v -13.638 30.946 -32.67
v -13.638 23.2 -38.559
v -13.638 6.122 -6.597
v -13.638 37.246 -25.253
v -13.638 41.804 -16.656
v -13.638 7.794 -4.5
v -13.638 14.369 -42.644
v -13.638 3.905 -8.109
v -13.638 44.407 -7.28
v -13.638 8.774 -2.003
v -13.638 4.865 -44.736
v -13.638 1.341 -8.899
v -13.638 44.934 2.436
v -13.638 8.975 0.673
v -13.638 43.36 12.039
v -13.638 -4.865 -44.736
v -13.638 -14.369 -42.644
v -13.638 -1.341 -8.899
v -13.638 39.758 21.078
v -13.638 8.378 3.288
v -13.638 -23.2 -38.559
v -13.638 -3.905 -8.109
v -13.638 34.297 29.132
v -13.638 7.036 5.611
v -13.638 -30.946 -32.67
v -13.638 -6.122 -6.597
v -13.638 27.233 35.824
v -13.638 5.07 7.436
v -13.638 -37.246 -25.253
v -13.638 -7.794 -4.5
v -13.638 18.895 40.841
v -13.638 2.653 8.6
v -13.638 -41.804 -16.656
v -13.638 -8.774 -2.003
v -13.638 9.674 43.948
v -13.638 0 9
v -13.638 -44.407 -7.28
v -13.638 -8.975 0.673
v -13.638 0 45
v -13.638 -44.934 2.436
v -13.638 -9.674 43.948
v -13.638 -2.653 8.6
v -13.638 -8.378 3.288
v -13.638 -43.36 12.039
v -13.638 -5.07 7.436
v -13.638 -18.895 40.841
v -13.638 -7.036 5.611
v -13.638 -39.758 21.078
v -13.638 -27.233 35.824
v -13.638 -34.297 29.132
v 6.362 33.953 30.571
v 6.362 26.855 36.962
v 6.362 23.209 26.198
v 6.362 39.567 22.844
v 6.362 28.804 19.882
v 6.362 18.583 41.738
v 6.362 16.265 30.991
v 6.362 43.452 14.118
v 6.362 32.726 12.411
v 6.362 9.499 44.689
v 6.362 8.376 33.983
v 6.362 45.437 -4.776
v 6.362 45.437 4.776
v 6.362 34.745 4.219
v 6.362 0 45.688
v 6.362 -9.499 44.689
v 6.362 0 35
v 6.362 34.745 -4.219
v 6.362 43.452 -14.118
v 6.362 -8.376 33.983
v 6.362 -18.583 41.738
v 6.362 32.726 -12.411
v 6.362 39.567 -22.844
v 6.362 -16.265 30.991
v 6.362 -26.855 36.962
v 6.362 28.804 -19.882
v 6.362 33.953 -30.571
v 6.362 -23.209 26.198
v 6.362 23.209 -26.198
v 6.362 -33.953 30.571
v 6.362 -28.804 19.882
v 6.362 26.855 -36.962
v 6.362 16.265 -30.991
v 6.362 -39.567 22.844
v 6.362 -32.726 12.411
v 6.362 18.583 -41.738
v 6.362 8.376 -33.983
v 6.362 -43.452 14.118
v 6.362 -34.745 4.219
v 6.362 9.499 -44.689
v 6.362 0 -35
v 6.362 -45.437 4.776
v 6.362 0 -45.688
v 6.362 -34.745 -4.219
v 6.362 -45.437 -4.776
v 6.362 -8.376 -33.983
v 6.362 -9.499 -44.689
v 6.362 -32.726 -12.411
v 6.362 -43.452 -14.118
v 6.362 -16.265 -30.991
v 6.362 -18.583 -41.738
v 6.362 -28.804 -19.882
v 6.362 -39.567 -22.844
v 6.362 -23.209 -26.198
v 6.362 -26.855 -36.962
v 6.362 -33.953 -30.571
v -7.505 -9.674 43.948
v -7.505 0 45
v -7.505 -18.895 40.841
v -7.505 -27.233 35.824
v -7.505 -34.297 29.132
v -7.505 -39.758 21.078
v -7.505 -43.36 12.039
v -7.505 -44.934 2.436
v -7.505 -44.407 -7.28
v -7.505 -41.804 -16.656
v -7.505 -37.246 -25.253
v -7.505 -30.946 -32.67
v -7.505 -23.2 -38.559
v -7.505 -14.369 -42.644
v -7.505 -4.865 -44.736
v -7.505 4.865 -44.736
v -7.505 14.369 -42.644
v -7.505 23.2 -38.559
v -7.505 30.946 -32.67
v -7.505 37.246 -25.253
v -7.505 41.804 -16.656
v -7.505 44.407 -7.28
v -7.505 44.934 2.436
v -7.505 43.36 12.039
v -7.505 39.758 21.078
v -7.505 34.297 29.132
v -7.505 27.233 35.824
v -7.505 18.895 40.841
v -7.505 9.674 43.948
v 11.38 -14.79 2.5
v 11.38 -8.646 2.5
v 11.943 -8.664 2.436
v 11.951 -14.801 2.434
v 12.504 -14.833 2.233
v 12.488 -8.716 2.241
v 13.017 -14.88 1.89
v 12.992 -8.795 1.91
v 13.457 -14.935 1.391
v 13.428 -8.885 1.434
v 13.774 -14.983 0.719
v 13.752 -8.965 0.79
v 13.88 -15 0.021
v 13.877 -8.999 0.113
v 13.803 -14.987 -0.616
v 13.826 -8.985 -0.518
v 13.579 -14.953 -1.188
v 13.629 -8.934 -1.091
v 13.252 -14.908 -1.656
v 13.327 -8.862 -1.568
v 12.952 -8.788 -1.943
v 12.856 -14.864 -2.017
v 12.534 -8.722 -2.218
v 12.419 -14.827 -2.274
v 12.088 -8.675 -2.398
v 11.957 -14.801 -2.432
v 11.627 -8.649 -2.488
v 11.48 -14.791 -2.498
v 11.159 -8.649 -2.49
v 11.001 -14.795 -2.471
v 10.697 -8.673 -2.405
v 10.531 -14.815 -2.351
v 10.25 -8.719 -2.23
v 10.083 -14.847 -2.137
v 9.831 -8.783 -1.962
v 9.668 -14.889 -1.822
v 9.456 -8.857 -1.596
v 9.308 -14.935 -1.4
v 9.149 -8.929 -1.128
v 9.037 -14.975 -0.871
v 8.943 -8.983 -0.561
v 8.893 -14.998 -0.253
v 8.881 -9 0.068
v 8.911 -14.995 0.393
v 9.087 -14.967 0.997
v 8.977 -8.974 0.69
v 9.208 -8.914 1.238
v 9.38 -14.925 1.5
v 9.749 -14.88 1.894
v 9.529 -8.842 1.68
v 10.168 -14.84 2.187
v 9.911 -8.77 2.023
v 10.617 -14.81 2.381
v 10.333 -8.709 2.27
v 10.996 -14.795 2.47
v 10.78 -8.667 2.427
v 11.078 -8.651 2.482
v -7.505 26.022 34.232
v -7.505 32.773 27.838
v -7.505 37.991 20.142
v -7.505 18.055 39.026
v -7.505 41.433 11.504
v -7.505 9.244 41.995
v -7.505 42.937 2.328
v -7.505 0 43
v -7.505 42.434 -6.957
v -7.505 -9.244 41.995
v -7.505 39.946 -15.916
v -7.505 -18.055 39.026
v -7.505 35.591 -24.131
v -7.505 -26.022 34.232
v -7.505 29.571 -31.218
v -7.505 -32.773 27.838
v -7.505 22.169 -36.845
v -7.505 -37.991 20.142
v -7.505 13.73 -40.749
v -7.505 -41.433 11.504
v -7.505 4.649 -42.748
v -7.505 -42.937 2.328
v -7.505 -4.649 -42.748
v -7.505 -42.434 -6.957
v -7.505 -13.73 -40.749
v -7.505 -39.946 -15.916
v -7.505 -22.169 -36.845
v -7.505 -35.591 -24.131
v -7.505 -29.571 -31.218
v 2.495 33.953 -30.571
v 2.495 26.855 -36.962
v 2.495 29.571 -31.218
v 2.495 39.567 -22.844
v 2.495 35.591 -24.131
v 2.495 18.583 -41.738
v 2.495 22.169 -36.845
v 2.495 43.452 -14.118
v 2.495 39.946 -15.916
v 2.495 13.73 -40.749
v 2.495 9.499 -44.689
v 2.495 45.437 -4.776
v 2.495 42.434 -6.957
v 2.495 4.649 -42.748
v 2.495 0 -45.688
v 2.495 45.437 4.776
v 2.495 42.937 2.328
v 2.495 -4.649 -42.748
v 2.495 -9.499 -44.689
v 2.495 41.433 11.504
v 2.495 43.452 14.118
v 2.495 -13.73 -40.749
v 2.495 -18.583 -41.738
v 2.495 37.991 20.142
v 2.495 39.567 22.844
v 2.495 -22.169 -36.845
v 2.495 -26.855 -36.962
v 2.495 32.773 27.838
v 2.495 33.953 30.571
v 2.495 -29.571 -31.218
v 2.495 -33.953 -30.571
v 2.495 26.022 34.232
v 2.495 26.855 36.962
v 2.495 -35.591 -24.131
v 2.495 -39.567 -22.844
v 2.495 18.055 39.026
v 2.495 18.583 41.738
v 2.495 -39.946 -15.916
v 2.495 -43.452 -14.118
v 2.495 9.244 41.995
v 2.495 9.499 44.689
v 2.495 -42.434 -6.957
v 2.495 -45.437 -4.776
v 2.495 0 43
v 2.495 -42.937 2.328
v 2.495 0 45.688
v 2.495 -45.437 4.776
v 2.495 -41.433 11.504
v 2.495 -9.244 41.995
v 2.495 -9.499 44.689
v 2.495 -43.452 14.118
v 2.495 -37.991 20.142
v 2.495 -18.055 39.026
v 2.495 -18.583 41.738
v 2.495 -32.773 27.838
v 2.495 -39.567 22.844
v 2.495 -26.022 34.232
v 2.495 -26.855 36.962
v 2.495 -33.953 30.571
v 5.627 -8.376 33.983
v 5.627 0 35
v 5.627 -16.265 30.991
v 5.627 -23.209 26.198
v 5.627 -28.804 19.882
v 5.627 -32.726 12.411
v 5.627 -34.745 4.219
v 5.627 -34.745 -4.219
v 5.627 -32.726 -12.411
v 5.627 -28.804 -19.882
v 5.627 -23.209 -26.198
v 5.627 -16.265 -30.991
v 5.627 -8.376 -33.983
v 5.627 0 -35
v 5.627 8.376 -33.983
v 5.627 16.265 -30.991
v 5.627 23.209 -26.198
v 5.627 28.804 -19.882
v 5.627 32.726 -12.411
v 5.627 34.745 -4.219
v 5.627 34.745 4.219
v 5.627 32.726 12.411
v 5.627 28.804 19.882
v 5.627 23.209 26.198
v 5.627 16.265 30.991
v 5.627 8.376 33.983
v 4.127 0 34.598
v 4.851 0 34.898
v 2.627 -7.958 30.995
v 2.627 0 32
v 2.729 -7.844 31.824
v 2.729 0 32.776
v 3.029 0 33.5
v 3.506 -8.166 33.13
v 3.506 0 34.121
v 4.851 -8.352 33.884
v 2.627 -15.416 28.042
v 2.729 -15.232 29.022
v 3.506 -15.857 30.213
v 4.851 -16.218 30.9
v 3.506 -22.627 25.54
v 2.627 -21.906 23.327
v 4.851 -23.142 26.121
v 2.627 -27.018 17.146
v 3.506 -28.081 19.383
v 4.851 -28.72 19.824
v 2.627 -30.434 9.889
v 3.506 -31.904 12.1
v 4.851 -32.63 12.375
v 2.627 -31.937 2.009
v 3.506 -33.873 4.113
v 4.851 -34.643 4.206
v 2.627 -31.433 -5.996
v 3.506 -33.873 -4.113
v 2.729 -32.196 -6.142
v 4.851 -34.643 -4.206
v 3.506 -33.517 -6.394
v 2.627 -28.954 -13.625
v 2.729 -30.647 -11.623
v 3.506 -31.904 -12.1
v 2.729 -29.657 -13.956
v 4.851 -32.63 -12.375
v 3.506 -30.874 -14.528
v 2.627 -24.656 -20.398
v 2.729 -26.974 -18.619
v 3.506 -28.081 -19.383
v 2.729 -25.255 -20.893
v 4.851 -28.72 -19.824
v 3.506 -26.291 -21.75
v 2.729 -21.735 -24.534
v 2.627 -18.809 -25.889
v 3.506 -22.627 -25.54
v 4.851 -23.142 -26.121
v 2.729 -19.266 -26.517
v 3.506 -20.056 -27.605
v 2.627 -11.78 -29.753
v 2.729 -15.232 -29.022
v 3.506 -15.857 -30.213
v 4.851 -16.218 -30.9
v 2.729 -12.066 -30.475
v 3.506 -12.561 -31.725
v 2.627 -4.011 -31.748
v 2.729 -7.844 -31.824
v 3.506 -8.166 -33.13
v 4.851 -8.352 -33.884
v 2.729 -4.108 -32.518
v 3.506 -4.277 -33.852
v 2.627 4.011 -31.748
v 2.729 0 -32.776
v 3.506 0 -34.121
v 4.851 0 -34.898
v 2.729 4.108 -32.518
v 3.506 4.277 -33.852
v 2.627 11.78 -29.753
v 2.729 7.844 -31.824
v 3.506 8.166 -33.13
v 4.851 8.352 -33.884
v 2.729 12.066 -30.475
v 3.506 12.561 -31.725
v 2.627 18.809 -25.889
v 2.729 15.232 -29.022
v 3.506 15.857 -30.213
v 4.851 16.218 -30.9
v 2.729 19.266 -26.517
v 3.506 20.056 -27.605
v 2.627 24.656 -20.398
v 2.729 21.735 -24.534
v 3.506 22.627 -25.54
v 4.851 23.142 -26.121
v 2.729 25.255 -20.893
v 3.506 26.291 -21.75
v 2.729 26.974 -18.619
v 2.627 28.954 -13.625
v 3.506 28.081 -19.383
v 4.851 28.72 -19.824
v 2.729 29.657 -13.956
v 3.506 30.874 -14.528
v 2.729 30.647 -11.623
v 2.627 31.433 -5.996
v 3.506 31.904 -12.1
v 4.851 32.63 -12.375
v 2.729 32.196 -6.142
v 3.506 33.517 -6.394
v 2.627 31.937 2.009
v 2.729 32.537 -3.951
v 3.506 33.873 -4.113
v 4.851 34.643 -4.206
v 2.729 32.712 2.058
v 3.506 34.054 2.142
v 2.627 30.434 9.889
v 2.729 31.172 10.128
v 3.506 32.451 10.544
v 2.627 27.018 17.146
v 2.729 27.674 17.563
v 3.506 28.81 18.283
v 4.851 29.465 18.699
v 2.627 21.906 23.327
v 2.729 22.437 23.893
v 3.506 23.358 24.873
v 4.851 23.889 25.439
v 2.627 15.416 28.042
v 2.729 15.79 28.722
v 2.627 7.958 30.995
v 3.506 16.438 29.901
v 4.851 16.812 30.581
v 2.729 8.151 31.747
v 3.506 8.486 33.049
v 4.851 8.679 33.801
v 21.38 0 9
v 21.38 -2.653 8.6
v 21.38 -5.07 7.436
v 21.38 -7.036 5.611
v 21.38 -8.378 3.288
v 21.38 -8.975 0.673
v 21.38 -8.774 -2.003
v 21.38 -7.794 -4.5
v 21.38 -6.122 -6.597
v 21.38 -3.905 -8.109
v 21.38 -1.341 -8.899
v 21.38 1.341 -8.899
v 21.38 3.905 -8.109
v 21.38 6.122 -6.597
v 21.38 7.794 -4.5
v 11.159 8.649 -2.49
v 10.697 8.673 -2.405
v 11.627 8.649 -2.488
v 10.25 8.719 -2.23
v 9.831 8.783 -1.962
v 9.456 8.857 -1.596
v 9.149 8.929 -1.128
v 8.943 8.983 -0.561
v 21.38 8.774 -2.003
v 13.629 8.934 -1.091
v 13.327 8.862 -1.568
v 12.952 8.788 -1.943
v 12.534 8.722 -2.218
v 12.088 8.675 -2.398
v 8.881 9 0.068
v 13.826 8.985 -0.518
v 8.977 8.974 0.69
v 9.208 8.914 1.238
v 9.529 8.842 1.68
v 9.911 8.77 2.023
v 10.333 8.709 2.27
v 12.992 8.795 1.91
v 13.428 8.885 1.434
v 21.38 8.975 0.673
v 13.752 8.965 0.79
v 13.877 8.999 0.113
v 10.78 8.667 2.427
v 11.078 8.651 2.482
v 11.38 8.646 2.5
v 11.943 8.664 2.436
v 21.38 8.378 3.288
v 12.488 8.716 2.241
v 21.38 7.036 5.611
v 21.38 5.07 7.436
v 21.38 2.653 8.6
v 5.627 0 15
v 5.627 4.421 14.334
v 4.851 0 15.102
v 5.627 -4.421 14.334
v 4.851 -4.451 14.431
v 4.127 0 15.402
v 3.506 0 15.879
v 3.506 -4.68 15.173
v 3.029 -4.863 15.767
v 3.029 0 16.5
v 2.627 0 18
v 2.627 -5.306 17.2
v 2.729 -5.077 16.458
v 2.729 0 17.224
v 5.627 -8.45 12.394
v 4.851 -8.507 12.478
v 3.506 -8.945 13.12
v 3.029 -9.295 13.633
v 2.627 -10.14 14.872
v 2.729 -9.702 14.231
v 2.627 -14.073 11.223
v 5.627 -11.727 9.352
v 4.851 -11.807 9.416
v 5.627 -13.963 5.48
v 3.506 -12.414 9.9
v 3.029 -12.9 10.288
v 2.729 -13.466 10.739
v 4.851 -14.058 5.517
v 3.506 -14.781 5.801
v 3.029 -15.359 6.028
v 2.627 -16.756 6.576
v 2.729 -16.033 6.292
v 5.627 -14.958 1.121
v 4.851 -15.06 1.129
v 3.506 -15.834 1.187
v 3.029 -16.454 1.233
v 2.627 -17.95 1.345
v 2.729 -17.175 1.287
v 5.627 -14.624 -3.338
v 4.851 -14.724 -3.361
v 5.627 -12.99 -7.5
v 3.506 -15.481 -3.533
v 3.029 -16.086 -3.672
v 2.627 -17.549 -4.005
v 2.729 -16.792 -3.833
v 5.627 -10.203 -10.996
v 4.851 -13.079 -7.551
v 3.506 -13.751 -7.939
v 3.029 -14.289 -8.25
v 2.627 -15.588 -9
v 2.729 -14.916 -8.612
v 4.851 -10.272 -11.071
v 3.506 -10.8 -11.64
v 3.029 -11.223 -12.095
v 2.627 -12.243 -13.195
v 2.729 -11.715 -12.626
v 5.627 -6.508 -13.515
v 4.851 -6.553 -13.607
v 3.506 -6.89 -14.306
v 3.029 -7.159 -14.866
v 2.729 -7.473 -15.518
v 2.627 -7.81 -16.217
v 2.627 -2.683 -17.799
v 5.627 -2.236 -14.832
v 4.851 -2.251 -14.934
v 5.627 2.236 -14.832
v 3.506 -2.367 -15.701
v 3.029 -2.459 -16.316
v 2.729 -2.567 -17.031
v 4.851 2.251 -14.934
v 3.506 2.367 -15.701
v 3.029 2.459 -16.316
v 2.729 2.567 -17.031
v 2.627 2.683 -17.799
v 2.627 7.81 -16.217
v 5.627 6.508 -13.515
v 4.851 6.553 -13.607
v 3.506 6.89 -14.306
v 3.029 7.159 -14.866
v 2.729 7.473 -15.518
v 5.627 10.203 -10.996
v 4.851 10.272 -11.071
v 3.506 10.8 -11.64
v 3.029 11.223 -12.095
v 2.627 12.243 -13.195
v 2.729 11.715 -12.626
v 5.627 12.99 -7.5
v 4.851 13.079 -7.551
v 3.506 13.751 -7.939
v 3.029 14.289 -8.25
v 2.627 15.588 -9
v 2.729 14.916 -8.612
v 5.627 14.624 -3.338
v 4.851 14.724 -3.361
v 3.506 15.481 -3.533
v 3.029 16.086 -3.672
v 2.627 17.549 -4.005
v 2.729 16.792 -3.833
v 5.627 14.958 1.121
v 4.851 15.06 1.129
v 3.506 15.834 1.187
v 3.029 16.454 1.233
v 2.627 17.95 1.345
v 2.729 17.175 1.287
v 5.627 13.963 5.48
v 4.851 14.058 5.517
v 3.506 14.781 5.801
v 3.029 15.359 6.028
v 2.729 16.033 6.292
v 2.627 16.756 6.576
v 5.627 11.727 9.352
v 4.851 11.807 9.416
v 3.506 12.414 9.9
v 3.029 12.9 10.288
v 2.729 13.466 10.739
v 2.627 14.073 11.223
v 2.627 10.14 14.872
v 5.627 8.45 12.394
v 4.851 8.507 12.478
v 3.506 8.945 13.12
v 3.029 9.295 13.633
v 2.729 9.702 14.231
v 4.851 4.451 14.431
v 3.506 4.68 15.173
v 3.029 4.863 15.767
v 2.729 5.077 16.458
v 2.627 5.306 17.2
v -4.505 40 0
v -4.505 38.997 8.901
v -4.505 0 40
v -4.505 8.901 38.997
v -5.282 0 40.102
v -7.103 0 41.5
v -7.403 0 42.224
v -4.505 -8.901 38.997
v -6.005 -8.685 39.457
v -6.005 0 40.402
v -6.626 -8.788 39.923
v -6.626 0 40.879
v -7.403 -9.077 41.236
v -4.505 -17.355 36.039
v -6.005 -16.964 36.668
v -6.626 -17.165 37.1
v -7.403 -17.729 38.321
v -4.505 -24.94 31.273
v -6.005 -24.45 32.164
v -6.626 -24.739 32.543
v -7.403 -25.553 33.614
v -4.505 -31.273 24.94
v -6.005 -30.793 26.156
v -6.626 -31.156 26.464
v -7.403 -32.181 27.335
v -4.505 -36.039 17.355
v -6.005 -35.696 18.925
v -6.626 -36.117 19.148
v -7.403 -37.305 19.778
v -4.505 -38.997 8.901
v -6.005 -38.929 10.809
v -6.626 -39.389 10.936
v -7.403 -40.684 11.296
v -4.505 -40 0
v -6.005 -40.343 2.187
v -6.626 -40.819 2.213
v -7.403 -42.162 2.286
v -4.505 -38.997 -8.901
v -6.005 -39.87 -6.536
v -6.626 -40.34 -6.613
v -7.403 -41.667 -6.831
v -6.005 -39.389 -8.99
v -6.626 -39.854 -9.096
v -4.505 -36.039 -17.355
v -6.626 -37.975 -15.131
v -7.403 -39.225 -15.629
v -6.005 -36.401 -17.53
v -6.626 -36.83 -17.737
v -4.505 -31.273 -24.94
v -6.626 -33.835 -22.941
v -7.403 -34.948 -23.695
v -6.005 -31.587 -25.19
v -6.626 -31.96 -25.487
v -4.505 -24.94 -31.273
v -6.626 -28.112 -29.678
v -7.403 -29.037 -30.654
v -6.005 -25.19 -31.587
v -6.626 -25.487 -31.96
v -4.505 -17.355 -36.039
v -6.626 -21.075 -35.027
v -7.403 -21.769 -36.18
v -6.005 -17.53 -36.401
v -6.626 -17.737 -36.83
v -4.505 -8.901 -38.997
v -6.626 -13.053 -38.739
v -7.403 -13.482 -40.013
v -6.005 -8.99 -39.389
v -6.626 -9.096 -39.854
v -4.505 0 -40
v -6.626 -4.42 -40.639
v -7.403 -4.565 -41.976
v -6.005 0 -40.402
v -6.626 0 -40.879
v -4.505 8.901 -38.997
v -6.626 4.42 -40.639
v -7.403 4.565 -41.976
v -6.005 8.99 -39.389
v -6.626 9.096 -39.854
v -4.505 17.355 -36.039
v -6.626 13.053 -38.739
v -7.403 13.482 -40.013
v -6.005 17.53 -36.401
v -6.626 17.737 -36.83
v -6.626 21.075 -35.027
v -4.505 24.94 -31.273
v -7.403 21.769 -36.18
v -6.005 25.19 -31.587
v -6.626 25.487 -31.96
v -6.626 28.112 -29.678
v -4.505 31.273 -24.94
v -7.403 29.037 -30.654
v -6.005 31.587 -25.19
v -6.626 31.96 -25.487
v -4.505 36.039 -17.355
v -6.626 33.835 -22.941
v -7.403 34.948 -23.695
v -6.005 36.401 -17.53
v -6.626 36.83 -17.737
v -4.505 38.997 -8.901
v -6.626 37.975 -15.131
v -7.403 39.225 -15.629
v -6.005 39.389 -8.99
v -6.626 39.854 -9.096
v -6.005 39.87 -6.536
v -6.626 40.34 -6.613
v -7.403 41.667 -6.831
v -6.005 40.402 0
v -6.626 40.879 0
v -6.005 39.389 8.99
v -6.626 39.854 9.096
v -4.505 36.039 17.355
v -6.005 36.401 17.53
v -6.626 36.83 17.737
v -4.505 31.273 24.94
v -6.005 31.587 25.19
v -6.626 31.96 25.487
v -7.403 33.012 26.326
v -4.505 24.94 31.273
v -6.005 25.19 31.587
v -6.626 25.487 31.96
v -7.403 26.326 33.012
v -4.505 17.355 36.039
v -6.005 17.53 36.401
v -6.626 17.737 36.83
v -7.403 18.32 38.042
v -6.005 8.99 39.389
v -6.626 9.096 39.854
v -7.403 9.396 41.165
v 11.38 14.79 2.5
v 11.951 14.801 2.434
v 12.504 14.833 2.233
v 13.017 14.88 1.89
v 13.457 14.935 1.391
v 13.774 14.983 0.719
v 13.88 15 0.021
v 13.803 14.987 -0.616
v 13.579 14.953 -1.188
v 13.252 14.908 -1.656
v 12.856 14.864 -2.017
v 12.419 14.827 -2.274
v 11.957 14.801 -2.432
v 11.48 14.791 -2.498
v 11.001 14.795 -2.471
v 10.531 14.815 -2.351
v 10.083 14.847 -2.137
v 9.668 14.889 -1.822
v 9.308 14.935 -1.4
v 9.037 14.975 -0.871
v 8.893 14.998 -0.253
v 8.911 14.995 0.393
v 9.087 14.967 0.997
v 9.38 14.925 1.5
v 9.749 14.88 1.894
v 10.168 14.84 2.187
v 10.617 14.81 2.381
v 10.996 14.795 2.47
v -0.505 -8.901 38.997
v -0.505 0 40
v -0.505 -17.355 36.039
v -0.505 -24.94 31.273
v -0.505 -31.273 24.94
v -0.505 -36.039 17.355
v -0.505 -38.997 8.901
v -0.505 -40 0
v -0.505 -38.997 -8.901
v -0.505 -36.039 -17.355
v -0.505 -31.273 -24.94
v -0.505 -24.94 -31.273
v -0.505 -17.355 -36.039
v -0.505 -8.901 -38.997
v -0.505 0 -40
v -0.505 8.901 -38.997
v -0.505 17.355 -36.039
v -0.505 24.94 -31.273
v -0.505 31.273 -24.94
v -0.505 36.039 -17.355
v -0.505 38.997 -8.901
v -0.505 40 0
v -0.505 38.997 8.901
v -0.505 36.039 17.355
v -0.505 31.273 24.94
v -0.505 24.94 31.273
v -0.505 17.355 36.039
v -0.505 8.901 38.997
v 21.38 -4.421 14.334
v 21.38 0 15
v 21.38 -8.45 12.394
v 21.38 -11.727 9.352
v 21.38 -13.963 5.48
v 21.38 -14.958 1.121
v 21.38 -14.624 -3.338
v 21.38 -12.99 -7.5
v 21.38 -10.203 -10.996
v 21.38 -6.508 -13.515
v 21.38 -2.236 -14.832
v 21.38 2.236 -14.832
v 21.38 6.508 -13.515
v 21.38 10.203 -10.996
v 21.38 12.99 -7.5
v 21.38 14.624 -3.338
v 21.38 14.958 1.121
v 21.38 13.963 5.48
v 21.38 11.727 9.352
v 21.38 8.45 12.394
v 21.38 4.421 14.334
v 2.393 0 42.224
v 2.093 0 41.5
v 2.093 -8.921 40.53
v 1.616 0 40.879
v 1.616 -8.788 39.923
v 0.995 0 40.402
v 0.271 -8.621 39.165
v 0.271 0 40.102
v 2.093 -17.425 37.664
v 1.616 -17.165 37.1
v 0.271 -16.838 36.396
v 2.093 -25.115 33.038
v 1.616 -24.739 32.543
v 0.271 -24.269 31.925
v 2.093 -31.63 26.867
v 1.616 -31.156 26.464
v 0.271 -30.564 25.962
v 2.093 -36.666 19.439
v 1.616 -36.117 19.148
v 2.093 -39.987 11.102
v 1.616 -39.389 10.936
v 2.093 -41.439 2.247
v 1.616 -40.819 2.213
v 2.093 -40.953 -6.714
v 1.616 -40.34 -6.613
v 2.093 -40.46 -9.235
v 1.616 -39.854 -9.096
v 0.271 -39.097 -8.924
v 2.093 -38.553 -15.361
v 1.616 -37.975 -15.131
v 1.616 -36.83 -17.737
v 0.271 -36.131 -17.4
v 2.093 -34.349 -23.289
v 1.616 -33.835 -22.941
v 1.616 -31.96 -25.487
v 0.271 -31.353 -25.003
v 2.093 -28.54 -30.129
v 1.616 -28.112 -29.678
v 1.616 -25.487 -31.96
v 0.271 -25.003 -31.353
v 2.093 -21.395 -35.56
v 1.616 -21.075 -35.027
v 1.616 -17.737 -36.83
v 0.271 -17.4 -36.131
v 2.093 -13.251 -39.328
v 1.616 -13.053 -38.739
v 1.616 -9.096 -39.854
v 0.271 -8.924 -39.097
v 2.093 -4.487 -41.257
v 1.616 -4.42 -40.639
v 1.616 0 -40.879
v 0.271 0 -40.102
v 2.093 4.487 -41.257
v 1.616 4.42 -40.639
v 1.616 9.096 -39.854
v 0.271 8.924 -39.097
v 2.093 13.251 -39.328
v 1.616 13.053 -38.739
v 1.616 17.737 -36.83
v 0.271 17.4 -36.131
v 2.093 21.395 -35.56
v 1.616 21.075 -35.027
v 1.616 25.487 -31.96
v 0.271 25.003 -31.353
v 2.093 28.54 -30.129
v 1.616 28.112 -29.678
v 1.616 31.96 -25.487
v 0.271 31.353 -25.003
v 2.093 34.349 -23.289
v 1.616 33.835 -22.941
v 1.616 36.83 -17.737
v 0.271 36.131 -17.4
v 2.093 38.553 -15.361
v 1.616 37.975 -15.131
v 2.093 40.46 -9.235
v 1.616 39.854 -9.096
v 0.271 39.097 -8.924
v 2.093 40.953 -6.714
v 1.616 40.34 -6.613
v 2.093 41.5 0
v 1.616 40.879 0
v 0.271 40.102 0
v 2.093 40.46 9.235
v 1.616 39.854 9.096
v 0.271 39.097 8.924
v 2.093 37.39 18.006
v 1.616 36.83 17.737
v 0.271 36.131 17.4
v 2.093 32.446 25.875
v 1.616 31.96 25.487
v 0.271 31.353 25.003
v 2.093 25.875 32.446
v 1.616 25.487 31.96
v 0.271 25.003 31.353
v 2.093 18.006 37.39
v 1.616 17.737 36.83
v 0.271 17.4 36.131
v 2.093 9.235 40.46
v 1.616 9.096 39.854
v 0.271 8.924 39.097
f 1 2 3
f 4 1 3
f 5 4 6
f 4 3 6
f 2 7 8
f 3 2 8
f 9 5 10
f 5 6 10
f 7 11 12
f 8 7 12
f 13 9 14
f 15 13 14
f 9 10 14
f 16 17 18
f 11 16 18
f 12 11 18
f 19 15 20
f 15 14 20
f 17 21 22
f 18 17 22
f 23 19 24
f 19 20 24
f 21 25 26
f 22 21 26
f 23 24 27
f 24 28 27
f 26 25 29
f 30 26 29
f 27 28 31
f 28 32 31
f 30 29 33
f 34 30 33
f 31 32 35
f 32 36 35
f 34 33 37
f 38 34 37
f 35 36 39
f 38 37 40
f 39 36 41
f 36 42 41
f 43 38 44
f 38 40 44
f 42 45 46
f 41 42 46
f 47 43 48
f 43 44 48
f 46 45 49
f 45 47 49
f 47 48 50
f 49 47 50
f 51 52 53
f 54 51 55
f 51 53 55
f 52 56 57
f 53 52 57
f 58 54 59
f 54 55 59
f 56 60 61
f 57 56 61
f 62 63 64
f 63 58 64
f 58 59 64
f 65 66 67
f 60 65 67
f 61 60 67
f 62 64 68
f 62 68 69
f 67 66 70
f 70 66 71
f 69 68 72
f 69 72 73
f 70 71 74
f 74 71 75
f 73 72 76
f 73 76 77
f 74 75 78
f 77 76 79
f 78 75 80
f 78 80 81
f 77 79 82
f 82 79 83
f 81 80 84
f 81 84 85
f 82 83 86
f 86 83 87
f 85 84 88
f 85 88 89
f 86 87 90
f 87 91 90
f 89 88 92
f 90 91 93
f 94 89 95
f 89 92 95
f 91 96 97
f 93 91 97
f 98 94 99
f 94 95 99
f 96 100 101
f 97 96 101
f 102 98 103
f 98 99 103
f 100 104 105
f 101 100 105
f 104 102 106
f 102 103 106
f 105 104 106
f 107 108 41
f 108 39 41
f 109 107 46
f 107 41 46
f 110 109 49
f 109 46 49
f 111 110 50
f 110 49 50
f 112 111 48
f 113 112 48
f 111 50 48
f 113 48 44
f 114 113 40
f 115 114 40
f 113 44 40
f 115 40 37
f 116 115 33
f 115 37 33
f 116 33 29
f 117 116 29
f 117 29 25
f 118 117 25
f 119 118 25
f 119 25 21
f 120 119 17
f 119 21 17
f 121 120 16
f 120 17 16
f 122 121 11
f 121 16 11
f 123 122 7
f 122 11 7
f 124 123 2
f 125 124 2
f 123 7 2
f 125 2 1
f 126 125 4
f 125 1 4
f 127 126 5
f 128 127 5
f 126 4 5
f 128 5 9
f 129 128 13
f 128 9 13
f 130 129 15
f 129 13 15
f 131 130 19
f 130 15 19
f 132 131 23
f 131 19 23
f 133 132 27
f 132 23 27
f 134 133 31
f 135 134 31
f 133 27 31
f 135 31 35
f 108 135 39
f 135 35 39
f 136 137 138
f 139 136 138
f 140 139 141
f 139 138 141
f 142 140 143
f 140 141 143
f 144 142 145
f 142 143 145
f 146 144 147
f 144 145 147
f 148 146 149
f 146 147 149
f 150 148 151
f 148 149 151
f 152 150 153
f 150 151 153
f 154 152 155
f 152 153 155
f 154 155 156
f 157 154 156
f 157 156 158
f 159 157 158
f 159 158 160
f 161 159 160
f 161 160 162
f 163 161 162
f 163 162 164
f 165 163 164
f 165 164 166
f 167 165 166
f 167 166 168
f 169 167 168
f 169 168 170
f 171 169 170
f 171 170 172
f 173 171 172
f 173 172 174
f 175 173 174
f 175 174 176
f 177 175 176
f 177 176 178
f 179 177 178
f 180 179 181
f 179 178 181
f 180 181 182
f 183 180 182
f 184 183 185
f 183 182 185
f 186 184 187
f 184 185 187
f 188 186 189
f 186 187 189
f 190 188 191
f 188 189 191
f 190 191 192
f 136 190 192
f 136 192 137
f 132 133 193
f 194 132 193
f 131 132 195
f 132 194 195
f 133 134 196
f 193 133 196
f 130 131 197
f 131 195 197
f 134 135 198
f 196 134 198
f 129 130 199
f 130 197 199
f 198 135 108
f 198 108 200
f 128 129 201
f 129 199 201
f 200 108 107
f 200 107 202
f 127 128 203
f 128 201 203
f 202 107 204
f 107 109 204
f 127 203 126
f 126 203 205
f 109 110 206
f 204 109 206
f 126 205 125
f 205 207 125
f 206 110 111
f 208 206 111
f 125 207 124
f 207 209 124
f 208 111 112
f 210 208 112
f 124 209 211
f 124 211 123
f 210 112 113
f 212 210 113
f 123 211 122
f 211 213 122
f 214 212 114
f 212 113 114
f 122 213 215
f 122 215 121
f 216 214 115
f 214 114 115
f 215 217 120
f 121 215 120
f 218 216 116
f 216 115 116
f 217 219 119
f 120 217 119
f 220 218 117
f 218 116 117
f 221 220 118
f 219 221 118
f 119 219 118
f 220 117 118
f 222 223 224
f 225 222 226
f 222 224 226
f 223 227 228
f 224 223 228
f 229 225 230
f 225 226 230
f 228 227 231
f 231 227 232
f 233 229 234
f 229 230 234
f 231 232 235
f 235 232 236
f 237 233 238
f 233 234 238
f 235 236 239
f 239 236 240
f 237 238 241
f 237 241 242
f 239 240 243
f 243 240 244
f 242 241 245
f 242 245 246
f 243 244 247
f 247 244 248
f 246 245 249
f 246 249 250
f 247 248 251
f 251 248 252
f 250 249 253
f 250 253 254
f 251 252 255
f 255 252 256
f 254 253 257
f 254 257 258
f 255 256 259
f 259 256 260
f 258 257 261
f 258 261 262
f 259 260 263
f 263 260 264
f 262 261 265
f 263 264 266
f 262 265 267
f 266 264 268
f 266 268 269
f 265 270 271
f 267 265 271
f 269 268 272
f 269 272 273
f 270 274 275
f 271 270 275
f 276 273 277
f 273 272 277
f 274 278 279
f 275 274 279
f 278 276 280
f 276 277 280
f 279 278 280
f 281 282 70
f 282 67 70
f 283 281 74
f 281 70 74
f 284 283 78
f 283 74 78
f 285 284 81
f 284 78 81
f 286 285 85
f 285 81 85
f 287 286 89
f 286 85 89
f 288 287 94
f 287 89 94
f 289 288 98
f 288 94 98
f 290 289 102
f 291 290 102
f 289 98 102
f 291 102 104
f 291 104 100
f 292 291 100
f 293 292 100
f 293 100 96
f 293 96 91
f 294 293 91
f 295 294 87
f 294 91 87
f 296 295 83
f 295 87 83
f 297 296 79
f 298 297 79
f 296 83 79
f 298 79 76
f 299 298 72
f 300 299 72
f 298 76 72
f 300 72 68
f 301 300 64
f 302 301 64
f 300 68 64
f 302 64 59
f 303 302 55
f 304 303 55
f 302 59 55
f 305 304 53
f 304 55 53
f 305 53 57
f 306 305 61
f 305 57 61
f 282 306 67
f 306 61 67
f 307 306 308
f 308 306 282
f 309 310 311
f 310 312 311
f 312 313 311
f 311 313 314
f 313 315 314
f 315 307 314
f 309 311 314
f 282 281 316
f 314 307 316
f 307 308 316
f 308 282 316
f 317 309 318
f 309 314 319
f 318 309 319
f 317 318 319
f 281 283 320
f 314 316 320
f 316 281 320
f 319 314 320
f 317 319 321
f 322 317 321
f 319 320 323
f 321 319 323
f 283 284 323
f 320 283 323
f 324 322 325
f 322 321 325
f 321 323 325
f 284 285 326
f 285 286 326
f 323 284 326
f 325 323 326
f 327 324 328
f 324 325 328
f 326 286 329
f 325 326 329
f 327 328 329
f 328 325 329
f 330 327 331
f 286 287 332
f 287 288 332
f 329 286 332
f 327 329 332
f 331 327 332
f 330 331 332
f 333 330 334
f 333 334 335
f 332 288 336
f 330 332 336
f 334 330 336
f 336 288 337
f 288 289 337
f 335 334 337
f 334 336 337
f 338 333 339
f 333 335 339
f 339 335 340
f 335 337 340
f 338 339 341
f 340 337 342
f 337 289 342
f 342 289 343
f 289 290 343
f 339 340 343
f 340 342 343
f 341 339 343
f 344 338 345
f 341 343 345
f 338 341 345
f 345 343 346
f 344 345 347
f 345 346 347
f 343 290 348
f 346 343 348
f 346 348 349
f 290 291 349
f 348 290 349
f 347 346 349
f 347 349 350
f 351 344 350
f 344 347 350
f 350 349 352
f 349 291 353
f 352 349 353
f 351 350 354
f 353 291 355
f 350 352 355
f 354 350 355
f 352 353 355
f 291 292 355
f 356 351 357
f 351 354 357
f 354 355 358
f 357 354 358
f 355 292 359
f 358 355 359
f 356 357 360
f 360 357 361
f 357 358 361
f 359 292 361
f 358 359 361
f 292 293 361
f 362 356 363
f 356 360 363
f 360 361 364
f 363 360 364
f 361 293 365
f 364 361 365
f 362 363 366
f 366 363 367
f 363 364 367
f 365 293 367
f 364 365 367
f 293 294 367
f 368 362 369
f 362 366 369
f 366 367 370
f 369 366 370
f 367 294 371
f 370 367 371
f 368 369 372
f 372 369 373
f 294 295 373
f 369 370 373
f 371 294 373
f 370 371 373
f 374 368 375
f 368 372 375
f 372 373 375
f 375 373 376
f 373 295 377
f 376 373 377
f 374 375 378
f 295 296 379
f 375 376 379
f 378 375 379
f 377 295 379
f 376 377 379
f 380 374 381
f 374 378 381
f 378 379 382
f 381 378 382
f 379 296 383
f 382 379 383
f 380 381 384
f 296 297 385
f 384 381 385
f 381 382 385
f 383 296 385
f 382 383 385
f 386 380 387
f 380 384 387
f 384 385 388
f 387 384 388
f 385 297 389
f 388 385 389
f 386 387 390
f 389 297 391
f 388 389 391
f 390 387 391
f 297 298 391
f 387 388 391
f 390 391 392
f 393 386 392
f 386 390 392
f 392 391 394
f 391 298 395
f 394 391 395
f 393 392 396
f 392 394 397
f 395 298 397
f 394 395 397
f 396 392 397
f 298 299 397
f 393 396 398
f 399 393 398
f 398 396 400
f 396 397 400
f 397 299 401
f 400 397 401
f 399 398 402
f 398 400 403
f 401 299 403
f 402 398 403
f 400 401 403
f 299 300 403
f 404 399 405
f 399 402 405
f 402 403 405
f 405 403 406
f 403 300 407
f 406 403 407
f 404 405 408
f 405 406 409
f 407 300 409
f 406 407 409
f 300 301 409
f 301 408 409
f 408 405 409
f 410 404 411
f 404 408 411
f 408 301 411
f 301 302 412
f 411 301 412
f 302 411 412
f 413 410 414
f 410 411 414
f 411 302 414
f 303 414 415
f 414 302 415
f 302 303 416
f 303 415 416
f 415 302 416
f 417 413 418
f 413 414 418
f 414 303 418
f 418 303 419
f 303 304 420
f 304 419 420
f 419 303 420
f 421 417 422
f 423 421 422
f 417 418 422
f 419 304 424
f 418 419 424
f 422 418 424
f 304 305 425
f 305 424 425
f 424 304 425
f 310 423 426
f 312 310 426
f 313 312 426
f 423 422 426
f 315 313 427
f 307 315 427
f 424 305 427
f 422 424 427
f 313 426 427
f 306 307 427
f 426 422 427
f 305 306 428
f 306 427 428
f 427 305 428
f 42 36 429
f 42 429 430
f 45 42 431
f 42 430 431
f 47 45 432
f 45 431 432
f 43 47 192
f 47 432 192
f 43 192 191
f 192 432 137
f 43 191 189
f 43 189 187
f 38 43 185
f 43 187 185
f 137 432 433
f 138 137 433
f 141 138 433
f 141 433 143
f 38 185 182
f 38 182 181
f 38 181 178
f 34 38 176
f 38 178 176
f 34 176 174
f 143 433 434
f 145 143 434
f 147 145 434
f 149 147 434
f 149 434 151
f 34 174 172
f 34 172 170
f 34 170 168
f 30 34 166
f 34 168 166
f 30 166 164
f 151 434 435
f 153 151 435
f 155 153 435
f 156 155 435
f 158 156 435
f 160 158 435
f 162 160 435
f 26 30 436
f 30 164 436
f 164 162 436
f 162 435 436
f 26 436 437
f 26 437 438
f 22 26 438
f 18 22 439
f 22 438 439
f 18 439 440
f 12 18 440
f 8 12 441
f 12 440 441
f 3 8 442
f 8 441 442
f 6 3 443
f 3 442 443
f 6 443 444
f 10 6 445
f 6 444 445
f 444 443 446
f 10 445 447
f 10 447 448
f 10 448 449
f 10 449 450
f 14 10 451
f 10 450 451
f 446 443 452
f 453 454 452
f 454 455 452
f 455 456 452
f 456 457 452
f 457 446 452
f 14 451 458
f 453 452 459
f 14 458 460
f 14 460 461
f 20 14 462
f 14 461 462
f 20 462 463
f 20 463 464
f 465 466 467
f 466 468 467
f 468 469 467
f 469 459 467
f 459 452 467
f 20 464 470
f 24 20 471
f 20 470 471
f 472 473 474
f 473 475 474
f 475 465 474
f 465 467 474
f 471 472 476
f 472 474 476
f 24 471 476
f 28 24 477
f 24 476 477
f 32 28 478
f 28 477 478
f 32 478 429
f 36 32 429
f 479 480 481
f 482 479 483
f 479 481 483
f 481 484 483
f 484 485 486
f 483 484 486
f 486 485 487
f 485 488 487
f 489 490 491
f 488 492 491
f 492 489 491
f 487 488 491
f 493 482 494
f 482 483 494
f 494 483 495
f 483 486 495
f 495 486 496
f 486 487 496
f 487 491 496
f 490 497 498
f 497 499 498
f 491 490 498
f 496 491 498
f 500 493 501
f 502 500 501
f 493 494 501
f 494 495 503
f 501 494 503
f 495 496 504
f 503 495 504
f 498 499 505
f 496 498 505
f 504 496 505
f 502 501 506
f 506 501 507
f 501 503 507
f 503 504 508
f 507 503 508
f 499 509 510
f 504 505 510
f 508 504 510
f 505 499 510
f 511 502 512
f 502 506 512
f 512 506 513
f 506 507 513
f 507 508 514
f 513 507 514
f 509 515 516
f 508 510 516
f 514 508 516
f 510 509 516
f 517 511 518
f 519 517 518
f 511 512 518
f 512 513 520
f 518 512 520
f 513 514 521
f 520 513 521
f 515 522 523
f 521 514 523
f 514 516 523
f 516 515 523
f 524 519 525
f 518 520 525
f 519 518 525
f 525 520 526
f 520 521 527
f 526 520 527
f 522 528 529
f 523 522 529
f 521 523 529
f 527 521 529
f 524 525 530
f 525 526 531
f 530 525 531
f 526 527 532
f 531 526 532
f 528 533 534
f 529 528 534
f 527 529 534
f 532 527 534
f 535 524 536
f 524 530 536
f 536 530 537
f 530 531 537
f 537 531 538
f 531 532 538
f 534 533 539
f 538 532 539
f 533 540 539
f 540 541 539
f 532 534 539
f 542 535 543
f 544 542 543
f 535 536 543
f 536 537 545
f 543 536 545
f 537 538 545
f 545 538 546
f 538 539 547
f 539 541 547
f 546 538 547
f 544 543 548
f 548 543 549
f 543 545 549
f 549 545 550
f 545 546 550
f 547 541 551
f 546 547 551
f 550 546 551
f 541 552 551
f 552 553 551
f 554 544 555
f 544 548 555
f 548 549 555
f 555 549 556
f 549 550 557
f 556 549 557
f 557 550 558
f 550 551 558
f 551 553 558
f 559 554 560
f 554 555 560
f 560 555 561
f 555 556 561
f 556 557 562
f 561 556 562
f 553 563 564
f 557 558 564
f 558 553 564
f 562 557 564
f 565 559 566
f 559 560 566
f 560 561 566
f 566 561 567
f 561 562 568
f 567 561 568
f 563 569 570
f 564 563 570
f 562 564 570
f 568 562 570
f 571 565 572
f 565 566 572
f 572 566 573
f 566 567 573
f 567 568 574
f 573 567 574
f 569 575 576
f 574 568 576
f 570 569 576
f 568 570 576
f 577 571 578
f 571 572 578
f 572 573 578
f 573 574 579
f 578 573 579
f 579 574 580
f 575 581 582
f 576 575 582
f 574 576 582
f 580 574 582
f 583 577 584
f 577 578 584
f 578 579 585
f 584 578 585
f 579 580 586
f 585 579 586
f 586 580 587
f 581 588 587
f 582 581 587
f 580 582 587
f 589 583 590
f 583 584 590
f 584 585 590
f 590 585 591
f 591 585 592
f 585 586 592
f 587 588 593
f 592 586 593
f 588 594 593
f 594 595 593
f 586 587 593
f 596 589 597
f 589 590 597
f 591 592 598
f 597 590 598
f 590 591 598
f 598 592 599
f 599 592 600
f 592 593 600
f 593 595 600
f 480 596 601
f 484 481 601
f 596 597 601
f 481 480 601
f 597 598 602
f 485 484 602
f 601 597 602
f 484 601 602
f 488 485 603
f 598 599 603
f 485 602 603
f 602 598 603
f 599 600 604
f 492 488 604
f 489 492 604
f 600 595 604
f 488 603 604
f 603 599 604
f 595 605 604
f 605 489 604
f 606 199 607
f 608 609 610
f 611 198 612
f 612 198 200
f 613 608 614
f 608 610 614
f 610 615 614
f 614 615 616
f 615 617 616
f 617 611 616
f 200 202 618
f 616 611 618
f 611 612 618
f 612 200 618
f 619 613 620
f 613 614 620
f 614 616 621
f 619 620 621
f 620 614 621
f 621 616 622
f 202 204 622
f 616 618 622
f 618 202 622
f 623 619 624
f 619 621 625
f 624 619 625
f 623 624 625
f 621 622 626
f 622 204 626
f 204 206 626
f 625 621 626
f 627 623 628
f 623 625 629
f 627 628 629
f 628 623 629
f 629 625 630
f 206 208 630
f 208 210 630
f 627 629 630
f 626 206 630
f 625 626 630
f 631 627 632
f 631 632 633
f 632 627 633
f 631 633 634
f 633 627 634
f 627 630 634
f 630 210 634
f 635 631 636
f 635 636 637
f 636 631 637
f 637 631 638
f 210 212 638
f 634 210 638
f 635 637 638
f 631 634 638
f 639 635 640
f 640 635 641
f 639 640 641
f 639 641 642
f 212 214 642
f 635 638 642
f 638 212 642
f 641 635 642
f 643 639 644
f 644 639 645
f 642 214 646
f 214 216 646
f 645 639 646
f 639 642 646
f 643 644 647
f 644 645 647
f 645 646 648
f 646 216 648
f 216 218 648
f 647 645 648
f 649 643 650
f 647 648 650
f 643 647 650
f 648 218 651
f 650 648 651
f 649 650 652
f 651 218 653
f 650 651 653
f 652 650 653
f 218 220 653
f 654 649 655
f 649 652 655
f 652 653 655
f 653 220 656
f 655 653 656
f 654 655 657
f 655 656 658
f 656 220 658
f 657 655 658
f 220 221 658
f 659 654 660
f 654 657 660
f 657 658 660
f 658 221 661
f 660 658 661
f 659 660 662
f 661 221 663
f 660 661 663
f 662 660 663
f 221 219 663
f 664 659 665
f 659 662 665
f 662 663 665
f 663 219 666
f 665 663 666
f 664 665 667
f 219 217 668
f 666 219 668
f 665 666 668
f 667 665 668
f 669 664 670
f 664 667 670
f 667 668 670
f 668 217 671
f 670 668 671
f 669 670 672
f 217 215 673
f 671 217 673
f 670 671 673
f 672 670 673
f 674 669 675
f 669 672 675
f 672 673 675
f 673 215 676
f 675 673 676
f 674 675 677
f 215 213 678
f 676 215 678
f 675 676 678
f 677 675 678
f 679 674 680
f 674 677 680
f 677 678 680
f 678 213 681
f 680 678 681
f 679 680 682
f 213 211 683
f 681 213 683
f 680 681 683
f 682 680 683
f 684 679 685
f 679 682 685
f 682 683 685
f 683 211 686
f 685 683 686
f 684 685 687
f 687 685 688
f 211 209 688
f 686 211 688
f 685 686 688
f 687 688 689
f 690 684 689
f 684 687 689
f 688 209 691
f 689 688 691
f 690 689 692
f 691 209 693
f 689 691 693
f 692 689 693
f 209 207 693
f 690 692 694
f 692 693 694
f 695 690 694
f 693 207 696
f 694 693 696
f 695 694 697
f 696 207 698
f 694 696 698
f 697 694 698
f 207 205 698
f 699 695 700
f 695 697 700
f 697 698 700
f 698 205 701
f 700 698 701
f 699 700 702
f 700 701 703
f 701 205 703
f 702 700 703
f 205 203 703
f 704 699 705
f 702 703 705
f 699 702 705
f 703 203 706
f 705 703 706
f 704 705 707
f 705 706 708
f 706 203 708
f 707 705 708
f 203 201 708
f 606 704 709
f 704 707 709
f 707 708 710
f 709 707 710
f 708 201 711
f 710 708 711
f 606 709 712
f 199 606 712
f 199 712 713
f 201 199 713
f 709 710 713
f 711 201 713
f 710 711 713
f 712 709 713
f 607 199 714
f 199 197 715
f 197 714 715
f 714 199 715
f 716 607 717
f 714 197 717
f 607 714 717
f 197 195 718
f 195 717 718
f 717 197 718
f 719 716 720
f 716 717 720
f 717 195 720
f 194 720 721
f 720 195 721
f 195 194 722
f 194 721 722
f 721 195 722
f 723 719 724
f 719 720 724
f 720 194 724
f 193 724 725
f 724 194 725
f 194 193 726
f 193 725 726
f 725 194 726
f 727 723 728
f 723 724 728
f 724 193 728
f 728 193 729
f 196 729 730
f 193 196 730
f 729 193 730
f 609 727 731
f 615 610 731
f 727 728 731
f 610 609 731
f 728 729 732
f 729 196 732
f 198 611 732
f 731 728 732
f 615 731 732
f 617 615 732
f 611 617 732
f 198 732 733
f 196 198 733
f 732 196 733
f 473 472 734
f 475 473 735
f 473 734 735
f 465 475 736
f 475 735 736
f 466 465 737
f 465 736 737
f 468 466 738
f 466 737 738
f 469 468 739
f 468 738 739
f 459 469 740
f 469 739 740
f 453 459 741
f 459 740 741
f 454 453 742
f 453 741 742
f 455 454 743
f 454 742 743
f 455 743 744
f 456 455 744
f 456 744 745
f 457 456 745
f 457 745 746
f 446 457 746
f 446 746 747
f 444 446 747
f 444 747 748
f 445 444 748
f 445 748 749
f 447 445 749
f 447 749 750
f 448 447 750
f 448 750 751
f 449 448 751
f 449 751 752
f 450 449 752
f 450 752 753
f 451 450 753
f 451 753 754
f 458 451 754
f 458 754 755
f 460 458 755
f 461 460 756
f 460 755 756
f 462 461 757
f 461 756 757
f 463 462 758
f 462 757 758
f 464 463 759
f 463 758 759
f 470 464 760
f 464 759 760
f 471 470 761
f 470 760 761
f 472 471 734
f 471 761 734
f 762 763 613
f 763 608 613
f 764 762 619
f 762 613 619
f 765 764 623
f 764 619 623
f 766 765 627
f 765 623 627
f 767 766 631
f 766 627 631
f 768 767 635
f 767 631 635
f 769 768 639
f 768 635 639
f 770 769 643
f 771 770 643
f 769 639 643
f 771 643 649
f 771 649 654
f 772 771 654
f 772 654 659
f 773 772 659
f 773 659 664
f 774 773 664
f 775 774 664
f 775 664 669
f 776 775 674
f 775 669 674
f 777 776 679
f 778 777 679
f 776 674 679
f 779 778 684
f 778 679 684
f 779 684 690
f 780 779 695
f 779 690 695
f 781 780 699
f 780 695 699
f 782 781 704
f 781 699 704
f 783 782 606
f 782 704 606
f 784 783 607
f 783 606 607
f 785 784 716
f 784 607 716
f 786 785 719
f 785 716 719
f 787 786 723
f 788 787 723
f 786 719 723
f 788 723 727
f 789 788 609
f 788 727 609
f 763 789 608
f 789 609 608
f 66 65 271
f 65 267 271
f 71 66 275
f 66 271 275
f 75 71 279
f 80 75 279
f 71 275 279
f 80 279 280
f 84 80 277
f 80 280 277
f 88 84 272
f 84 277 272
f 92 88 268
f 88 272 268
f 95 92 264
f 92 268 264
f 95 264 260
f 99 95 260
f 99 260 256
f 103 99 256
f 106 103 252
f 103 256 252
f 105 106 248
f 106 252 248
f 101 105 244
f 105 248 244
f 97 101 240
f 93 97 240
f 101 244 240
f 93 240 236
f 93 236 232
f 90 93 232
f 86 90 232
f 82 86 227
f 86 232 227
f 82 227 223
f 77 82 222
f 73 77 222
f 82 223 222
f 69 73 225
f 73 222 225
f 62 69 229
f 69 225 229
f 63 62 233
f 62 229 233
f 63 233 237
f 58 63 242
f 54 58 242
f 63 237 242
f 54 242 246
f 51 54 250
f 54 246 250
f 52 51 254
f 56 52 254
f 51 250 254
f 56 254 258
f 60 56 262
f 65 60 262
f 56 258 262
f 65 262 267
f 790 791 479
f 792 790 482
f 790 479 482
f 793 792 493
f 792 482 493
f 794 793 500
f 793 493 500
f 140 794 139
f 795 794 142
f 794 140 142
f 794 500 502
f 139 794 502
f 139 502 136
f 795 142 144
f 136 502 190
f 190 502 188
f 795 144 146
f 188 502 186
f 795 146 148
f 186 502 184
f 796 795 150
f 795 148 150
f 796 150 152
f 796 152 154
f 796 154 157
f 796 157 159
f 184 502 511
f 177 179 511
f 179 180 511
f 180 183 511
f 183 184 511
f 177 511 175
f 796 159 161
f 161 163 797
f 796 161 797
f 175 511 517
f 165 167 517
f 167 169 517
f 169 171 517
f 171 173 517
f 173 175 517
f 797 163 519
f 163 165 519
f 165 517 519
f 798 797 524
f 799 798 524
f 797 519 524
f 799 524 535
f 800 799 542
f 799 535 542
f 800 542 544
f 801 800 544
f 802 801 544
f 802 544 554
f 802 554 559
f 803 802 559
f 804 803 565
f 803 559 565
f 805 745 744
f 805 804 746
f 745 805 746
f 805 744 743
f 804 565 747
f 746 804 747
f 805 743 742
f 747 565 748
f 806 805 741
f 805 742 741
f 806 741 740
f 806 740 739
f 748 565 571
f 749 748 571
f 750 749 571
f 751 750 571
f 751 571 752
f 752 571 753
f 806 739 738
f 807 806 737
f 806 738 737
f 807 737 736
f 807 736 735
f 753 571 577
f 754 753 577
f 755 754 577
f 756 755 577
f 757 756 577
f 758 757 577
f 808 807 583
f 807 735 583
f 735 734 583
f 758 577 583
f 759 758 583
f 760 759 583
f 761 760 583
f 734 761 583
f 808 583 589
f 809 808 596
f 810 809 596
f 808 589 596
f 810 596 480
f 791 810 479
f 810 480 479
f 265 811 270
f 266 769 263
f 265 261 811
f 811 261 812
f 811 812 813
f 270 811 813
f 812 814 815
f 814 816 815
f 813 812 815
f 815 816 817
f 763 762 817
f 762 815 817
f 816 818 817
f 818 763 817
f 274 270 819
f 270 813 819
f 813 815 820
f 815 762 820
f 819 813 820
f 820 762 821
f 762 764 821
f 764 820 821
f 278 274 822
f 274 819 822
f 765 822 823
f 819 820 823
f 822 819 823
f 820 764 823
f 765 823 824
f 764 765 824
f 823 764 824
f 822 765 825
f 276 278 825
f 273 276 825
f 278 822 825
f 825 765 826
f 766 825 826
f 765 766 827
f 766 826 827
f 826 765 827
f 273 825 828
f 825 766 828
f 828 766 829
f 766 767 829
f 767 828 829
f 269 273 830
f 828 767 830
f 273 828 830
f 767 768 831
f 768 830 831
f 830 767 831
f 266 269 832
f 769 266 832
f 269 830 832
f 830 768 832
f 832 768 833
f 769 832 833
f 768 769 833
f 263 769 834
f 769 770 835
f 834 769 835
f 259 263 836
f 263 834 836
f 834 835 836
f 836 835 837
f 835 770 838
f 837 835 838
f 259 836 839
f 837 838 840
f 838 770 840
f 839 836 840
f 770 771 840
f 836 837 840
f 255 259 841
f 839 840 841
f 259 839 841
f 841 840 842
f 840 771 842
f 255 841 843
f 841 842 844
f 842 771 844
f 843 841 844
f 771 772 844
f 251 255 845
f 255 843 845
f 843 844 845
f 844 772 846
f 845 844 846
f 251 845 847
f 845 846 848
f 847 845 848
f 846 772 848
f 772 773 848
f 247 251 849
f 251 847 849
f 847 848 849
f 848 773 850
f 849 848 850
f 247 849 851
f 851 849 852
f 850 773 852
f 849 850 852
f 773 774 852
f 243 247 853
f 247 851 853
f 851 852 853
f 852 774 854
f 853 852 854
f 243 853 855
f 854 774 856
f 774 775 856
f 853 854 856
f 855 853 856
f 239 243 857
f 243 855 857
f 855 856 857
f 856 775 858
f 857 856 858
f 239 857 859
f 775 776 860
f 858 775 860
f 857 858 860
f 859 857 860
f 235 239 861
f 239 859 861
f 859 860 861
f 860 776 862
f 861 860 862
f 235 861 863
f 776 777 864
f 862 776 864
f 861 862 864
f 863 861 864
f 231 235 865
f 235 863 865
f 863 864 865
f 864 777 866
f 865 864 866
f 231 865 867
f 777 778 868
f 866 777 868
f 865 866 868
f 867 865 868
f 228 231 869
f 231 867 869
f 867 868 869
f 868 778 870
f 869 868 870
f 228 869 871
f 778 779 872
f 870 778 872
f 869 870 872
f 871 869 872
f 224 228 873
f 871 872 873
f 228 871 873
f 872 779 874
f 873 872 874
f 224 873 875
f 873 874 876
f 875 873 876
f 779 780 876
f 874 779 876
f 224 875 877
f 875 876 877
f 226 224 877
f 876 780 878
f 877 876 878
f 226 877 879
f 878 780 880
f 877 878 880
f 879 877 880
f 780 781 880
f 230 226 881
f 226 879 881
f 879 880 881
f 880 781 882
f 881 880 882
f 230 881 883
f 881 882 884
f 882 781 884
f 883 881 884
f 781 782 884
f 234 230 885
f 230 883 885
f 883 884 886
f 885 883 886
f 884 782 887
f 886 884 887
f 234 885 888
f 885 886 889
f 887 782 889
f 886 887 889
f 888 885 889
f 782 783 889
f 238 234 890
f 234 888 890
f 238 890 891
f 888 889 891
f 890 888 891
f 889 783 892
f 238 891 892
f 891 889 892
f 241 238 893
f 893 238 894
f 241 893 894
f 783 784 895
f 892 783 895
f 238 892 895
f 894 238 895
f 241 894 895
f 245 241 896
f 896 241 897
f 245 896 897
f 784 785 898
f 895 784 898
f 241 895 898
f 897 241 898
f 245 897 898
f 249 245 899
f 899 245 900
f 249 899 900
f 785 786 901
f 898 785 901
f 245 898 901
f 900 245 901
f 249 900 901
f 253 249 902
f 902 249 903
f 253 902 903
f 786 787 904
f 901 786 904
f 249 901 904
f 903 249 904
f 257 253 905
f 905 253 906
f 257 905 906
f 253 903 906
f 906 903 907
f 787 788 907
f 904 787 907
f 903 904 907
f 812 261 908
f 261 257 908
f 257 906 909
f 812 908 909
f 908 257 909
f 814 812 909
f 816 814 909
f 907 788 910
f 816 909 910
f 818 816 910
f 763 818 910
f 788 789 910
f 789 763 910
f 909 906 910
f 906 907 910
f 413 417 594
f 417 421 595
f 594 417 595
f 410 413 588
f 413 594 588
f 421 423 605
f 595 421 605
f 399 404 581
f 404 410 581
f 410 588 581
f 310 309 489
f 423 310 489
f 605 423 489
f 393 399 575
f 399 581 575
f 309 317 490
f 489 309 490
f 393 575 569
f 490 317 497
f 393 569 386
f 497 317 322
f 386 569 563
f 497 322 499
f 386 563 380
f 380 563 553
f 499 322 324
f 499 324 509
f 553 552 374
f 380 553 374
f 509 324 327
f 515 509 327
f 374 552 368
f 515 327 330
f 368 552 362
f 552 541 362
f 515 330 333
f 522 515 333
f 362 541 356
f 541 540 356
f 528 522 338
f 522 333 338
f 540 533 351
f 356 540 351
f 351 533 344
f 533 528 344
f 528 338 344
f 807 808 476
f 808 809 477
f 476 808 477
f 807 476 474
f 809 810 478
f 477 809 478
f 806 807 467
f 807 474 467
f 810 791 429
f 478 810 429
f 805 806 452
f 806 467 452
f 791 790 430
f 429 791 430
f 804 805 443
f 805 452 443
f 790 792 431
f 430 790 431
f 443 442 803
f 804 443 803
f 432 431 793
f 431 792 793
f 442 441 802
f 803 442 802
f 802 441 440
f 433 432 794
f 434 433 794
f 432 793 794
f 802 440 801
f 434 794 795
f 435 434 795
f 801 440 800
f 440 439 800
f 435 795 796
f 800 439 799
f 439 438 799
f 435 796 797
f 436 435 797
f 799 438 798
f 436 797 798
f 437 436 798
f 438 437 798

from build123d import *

# Parameters (mm, degrees)
SKETCH2_R          = 2.5
CUT_EXTRUDE1_DEPTH = 79.914255008


with BuildPart() as part:
    # Sketch1 → Revolve2 (revolve)
    with BuildSketch(Plane.XY, mode=Mode.PRIVATE) as revolve2_sk:
        with BuildLine():
            Line((-13.637604781, 9), (21.379821609, 9))
            Line((21.379821609, 9), (21.379821609, 15))
            Line((21.379821609, 15), (5.627244289, 15))
            ThreePointArc((5.627244289, 15), (3.505923946, 15.878679656), (2.627244289, 18))
            Line((2.627244289, 18), (2.627244289, 32))
            ThreePointArc((2.627244289, 32), (3.505923946, 34.121320344), (5.627244289, 35))
            Line((5.627244289, 35), (6.362395219, 35))
            Line((6.362395219, 35), (6.362395219, 45.687700042))
            Line((6.362395219, 45.687700042), (2.494845361, 45.687700042))
            Line((2.494845361, 45.687700042), (2.494845361, 43))
            ThreePointArc((2.494845361, 43), (1.616165704, 40.878679656), (-0.505154639, 40))
            Line((-0.505154639, 40), (-4.505154639, 40))
            ThreePointArc((-4.505154639, 40), (-6.626474983, 40.878679656), (-7.505154639, 43))
            Line((-7.505154639, 43), (-7.505154639, 45))
            Line((-7.505154639, 45), (-13.637604781, 45))
            Line((-13.637604781, 45), (-13.637604781, 9))
        make_face()
    revolve(revolve2_sk.sketch.rotate(Axis((-27.298969072, 0, 0), (1, 0, 0)), 90), axis=Axis((-27.298969072, 0, 0), (1, 0, 0)))

    # Sketch2 → Cut-Extrude1 (cut, through all)
    with BuildSketch(Plane(origin=(0, 15, 0), x_dir=(1, 0, 0), z_dir=(0, 1, 0))):
        with Locations(Location((11.379821609, 0, 0), (0, 0, 270))):
            Circle(SKETCH2_R)
    extrude(amount=-CUT_EXTRUDE1_DEPTH, mode=Mode.SUBTRACT)


solid = part.part
